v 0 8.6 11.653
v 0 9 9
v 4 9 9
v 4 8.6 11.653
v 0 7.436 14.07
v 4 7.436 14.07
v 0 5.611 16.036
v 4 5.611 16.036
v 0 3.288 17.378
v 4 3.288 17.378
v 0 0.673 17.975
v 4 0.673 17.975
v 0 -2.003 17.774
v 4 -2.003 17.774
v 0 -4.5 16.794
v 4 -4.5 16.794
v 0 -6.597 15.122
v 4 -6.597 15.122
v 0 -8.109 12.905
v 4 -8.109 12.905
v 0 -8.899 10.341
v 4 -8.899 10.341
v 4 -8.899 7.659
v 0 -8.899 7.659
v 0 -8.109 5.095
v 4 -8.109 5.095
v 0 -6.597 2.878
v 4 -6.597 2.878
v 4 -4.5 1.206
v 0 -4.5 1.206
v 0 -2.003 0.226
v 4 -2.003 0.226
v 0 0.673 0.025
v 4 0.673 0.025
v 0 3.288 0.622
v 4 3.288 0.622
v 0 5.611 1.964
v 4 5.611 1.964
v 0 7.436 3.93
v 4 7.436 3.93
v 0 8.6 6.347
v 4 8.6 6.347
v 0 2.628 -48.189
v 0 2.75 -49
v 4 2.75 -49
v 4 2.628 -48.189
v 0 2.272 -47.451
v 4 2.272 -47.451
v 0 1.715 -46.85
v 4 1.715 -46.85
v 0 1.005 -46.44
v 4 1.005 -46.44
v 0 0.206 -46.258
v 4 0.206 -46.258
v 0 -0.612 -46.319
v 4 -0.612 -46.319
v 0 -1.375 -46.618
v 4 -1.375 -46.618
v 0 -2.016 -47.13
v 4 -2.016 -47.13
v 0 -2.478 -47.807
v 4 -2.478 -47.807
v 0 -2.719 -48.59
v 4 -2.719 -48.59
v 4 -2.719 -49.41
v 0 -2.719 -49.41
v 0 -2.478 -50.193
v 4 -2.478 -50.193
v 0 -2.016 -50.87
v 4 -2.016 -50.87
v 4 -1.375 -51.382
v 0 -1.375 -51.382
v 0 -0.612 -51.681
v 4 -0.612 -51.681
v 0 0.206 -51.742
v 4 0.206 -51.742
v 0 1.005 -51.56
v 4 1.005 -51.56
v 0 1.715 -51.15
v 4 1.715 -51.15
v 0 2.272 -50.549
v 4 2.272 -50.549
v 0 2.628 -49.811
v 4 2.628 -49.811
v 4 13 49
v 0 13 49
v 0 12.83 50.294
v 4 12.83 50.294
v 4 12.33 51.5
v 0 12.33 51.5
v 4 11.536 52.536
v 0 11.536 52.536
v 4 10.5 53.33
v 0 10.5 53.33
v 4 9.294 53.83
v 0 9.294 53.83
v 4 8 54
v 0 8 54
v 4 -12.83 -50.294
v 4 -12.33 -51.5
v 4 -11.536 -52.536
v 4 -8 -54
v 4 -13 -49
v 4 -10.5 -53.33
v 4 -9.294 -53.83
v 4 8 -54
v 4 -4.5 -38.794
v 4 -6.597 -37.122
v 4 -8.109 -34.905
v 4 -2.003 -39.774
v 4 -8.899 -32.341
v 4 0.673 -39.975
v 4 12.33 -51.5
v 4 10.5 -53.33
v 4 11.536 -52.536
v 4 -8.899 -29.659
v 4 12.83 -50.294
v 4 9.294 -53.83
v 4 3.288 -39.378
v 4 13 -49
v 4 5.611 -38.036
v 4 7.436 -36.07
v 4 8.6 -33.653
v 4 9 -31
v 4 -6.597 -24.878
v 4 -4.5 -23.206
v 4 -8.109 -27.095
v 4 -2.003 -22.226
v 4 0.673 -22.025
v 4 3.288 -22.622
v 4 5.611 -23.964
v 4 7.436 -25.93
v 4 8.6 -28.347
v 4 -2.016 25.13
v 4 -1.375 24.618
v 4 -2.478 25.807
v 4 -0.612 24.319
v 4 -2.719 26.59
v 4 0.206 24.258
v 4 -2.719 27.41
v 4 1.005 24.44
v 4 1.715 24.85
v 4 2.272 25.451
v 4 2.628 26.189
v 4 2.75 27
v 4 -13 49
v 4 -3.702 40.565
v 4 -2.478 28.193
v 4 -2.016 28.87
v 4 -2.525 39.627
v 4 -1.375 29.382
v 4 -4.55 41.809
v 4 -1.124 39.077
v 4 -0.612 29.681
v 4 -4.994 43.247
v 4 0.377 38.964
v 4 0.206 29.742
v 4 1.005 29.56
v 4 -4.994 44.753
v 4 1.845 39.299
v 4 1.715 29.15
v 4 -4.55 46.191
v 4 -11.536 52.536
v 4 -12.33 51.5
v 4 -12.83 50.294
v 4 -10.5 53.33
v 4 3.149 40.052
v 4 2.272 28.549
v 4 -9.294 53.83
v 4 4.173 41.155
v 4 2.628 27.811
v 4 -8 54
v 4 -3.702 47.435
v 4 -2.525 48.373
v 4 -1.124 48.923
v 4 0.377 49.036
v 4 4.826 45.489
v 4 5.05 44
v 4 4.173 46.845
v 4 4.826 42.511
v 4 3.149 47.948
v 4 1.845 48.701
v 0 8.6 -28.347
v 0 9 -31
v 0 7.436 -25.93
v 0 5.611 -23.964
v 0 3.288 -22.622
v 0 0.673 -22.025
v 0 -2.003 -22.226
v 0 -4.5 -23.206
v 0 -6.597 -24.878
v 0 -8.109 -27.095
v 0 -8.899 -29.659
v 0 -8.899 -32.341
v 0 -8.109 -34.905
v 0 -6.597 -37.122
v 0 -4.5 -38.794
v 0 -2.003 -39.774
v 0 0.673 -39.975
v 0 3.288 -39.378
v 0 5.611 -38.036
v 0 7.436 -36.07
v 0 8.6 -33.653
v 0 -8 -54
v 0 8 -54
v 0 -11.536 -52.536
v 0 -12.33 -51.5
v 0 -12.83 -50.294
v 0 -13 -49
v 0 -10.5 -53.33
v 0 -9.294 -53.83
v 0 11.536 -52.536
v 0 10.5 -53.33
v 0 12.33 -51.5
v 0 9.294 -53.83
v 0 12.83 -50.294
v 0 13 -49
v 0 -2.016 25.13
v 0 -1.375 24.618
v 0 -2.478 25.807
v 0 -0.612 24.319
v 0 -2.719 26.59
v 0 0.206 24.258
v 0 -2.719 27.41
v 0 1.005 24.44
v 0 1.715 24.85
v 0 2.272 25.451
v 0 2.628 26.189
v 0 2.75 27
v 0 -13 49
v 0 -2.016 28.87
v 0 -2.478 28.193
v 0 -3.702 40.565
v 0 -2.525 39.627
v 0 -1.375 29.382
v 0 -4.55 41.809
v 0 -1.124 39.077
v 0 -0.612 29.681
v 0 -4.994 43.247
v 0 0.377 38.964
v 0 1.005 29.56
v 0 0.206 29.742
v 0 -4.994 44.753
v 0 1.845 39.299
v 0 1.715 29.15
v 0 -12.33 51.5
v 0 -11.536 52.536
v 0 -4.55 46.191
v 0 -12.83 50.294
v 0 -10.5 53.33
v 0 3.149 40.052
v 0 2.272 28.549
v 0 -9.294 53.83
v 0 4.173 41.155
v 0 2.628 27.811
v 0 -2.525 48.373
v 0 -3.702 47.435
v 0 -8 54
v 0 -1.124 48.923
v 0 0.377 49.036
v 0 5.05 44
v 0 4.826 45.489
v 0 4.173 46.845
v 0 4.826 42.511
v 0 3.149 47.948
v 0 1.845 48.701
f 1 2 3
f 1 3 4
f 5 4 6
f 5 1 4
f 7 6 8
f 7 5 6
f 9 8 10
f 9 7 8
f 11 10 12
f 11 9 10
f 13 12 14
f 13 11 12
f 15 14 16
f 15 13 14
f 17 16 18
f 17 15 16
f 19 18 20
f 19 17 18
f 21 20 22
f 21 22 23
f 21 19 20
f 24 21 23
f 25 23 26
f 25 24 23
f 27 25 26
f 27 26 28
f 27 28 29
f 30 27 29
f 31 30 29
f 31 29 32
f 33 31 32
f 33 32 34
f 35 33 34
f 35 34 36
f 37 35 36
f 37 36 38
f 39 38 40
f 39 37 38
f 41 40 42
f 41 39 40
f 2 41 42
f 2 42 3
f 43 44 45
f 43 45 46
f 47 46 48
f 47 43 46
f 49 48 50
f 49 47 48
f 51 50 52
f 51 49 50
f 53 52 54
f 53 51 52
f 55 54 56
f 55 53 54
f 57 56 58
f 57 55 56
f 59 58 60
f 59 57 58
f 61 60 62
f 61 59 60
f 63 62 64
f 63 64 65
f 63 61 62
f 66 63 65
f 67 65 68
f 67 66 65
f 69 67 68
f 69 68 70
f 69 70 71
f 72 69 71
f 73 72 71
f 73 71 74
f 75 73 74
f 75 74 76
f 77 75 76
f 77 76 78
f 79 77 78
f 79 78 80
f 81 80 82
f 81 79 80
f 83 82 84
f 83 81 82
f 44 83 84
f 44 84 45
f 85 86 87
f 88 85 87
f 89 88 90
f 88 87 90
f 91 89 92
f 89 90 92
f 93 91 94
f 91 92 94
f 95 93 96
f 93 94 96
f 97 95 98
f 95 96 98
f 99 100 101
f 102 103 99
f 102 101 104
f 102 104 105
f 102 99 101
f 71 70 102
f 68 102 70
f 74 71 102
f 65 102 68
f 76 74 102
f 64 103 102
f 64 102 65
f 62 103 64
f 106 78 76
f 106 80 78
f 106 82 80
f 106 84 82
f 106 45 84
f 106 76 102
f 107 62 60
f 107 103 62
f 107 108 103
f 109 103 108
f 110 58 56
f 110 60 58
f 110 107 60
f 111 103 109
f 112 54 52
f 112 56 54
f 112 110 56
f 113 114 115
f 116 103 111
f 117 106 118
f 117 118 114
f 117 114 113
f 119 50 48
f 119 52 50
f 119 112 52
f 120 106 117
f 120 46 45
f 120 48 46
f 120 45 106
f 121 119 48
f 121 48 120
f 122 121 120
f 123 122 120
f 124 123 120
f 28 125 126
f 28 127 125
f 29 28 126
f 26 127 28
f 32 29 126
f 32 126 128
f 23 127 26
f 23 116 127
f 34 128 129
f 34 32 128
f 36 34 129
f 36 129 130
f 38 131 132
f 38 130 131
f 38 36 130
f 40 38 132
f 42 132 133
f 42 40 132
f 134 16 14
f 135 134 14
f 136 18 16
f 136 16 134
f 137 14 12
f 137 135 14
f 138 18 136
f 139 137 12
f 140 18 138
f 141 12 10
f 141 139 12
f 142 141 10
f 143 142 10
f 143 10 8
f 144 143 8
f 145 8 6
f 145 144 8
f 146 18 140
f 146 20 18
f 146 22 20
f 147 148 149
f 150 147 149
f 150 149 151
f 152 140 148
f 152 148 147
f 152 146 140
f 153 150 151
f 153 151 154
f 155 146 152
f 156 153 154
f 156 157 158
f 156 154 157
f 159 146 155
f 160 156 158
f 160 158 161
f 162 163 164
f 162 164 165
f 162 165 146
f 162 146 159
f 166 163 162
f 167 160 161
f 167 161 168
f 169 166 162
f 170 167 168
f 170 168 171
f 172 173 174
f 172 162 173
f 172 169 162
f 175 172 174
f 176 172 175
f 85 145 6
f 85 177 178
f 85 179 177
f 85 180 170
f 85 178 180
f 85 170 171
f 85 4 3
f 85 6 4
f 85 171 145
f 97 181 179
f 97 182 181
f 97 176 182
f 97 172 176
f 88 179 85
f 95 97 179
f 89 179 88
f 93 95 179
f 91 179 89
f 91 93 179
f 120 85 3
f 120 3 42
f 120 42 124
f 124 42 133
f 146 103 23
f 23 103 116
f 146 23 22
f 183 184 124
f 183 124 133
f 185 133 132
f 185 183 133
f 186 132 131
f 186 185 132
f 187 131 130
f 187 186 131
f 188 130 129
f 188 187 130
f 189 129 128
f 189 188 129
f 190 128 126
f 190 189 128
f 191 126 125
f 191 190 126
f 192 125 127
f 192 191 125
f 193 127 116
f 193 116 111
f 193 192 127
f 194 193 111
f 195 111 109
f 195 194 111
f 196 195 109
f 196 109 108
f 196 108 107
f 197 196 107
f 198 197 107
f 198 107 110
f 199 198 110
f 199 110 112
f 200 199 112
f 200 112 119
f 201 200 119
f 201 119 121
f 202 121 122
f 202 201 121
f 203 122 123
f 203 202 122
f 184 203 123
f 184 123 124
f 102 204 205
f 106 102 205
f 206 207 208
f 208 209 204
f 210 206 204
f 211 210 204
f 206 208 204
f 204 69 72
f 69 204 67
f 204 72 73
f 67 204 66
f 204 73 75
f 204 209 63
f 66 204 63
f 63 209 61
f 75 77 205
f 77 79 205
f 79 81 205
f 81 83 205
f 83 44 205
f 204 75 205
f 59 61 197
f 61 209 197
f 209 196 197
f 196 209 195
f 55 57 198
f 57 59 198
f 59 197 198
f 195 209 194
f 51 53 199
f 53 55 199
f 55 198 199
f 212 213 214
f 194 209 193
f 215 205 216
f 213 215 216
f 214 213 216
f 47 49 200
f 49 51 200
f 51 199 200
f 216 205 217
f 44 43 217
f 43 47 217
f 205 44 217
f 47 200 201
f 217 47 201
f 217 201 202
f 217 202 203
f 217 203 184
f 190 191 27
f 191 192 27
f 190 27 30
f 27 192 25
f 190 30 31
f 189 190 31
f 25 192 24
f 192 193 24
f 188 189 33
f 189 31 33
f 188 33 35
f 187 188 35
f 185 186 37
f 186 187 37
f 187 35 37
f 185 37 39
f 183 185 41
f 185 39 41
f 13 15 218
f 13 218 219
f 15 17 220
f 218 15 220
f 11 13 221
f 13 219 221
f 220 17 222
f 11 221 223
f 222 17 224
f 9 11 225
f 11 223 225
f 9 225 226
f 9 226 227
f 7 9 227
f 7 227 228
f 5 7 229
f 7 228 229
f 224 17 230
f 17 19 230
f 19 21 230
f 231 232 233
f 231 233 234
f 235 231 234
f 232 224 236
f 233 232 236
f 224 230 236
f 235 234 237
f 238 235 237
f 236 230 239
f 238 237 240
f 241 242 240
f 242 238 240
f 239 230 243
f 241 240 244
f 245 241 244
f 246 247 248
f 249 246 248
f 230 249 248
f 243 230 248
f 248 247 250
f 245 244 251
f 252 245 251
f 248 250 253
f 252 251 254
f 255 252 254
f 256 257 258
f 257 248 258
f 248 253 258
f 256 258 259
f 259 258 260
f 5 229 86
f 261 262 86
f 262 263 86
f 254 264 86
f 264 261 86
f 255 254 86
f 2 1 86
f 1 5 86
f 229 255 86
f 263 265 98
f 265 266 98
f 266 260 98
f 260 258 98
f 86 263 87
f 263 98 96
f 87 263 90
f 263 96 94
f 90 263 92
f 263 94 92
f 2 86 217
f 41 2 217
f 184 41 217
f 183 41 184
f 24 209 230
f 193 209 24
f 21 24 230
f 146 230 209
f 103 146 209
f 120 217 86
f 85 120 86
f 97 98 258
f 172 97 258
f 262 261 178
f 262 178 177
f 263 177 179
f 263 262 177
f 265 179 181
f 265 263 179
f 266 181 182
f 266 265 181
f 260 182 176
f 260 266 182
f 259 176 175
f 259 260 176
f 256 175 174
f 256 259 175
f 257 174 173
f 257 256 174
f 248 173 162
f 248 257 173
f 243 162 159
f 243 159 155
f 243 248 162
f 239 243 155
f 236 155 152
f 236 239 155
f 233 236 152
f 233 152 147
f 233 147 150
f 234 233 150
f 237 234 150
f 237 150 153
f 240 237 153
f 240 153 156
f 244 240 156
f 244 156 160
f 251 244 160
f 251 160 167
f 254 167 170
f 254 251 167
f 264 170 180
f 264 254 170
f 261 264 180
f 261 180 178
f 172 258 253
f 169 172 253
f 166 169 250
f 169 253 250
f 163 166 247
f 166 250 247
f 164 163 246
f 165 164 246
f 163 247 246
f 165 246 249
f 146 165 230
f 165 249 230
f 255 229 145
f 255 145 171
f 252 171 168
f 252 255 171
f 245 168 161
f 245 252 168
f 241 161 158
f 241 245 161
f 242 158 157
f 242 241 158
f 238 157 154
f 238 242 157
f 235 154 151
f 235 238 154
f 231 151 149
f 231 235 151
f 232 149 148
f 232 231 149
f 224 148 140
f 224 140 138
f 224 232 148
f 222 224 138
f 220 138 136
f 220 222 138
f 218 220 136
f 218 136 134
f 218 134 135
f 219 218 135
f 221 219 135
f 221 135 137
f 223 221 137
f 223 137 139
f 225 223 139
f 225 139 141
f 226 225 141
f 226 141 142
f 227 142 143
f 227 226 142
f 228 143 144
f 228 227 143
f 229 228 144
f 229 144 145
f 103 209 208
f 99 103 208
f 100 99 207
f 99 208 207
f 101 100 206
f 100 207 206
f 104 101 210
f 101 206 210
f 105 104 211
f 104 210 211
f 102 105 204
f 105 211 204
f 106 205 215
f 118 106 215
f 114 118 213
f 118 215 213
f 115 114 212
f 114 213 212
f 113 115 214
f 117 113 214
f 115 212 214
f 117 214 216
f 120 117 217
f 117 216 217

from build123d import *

# Parameters (mm, degrees)
F0_R     = 2.75
F0_R_2   = 9
F0_R_3   = 5.05
F1_DEPTH = 4


with BuildPart() as f1:
    # F0 (on Right) → F1 (new body)
    with BuildSketch(Plane.YZ):
        with BuildLine():
            Line((-8, -54), (8, -54))
            ThreePointArc((8, -54), (11.535534, -52.535534), (13, -49))
            Line((13, -49), (13, 49))
            ThreePointArc((13, 49), (11.535534, 52.535534), (8, 54))
            Line((8, 54), (-8, 54))
            ThreePointArc((-8, 54), (-11.535534, 52.535534), (-13, 49))
            Line((-13, 49), (-13, -49))
            ThreePointArc((-13, -49), (-11.535534, -52.535534), (-8, -54))
        make_face()
        with Locations((0, -49)):
            Circle(F0_R, mode=Mode.SUBTRACT)
        with Locations((0, -31)):
            Circle(F0_R_2, mode=Mode.SUBTRACT)
        with Locations((0, 9)):
            Circle(F0_R_2, mode=Mode.SUBTRACT)
        with Locations((0, 27)):
            Circle(F0_R, mode=Mode.SUBTRACT)
        with Locations((0, 44)):
            Circle(F0_R_3, mode=Mode.SUBTRACT)
    extrude(amount=F1_DEPTH)


solid = f1.part
